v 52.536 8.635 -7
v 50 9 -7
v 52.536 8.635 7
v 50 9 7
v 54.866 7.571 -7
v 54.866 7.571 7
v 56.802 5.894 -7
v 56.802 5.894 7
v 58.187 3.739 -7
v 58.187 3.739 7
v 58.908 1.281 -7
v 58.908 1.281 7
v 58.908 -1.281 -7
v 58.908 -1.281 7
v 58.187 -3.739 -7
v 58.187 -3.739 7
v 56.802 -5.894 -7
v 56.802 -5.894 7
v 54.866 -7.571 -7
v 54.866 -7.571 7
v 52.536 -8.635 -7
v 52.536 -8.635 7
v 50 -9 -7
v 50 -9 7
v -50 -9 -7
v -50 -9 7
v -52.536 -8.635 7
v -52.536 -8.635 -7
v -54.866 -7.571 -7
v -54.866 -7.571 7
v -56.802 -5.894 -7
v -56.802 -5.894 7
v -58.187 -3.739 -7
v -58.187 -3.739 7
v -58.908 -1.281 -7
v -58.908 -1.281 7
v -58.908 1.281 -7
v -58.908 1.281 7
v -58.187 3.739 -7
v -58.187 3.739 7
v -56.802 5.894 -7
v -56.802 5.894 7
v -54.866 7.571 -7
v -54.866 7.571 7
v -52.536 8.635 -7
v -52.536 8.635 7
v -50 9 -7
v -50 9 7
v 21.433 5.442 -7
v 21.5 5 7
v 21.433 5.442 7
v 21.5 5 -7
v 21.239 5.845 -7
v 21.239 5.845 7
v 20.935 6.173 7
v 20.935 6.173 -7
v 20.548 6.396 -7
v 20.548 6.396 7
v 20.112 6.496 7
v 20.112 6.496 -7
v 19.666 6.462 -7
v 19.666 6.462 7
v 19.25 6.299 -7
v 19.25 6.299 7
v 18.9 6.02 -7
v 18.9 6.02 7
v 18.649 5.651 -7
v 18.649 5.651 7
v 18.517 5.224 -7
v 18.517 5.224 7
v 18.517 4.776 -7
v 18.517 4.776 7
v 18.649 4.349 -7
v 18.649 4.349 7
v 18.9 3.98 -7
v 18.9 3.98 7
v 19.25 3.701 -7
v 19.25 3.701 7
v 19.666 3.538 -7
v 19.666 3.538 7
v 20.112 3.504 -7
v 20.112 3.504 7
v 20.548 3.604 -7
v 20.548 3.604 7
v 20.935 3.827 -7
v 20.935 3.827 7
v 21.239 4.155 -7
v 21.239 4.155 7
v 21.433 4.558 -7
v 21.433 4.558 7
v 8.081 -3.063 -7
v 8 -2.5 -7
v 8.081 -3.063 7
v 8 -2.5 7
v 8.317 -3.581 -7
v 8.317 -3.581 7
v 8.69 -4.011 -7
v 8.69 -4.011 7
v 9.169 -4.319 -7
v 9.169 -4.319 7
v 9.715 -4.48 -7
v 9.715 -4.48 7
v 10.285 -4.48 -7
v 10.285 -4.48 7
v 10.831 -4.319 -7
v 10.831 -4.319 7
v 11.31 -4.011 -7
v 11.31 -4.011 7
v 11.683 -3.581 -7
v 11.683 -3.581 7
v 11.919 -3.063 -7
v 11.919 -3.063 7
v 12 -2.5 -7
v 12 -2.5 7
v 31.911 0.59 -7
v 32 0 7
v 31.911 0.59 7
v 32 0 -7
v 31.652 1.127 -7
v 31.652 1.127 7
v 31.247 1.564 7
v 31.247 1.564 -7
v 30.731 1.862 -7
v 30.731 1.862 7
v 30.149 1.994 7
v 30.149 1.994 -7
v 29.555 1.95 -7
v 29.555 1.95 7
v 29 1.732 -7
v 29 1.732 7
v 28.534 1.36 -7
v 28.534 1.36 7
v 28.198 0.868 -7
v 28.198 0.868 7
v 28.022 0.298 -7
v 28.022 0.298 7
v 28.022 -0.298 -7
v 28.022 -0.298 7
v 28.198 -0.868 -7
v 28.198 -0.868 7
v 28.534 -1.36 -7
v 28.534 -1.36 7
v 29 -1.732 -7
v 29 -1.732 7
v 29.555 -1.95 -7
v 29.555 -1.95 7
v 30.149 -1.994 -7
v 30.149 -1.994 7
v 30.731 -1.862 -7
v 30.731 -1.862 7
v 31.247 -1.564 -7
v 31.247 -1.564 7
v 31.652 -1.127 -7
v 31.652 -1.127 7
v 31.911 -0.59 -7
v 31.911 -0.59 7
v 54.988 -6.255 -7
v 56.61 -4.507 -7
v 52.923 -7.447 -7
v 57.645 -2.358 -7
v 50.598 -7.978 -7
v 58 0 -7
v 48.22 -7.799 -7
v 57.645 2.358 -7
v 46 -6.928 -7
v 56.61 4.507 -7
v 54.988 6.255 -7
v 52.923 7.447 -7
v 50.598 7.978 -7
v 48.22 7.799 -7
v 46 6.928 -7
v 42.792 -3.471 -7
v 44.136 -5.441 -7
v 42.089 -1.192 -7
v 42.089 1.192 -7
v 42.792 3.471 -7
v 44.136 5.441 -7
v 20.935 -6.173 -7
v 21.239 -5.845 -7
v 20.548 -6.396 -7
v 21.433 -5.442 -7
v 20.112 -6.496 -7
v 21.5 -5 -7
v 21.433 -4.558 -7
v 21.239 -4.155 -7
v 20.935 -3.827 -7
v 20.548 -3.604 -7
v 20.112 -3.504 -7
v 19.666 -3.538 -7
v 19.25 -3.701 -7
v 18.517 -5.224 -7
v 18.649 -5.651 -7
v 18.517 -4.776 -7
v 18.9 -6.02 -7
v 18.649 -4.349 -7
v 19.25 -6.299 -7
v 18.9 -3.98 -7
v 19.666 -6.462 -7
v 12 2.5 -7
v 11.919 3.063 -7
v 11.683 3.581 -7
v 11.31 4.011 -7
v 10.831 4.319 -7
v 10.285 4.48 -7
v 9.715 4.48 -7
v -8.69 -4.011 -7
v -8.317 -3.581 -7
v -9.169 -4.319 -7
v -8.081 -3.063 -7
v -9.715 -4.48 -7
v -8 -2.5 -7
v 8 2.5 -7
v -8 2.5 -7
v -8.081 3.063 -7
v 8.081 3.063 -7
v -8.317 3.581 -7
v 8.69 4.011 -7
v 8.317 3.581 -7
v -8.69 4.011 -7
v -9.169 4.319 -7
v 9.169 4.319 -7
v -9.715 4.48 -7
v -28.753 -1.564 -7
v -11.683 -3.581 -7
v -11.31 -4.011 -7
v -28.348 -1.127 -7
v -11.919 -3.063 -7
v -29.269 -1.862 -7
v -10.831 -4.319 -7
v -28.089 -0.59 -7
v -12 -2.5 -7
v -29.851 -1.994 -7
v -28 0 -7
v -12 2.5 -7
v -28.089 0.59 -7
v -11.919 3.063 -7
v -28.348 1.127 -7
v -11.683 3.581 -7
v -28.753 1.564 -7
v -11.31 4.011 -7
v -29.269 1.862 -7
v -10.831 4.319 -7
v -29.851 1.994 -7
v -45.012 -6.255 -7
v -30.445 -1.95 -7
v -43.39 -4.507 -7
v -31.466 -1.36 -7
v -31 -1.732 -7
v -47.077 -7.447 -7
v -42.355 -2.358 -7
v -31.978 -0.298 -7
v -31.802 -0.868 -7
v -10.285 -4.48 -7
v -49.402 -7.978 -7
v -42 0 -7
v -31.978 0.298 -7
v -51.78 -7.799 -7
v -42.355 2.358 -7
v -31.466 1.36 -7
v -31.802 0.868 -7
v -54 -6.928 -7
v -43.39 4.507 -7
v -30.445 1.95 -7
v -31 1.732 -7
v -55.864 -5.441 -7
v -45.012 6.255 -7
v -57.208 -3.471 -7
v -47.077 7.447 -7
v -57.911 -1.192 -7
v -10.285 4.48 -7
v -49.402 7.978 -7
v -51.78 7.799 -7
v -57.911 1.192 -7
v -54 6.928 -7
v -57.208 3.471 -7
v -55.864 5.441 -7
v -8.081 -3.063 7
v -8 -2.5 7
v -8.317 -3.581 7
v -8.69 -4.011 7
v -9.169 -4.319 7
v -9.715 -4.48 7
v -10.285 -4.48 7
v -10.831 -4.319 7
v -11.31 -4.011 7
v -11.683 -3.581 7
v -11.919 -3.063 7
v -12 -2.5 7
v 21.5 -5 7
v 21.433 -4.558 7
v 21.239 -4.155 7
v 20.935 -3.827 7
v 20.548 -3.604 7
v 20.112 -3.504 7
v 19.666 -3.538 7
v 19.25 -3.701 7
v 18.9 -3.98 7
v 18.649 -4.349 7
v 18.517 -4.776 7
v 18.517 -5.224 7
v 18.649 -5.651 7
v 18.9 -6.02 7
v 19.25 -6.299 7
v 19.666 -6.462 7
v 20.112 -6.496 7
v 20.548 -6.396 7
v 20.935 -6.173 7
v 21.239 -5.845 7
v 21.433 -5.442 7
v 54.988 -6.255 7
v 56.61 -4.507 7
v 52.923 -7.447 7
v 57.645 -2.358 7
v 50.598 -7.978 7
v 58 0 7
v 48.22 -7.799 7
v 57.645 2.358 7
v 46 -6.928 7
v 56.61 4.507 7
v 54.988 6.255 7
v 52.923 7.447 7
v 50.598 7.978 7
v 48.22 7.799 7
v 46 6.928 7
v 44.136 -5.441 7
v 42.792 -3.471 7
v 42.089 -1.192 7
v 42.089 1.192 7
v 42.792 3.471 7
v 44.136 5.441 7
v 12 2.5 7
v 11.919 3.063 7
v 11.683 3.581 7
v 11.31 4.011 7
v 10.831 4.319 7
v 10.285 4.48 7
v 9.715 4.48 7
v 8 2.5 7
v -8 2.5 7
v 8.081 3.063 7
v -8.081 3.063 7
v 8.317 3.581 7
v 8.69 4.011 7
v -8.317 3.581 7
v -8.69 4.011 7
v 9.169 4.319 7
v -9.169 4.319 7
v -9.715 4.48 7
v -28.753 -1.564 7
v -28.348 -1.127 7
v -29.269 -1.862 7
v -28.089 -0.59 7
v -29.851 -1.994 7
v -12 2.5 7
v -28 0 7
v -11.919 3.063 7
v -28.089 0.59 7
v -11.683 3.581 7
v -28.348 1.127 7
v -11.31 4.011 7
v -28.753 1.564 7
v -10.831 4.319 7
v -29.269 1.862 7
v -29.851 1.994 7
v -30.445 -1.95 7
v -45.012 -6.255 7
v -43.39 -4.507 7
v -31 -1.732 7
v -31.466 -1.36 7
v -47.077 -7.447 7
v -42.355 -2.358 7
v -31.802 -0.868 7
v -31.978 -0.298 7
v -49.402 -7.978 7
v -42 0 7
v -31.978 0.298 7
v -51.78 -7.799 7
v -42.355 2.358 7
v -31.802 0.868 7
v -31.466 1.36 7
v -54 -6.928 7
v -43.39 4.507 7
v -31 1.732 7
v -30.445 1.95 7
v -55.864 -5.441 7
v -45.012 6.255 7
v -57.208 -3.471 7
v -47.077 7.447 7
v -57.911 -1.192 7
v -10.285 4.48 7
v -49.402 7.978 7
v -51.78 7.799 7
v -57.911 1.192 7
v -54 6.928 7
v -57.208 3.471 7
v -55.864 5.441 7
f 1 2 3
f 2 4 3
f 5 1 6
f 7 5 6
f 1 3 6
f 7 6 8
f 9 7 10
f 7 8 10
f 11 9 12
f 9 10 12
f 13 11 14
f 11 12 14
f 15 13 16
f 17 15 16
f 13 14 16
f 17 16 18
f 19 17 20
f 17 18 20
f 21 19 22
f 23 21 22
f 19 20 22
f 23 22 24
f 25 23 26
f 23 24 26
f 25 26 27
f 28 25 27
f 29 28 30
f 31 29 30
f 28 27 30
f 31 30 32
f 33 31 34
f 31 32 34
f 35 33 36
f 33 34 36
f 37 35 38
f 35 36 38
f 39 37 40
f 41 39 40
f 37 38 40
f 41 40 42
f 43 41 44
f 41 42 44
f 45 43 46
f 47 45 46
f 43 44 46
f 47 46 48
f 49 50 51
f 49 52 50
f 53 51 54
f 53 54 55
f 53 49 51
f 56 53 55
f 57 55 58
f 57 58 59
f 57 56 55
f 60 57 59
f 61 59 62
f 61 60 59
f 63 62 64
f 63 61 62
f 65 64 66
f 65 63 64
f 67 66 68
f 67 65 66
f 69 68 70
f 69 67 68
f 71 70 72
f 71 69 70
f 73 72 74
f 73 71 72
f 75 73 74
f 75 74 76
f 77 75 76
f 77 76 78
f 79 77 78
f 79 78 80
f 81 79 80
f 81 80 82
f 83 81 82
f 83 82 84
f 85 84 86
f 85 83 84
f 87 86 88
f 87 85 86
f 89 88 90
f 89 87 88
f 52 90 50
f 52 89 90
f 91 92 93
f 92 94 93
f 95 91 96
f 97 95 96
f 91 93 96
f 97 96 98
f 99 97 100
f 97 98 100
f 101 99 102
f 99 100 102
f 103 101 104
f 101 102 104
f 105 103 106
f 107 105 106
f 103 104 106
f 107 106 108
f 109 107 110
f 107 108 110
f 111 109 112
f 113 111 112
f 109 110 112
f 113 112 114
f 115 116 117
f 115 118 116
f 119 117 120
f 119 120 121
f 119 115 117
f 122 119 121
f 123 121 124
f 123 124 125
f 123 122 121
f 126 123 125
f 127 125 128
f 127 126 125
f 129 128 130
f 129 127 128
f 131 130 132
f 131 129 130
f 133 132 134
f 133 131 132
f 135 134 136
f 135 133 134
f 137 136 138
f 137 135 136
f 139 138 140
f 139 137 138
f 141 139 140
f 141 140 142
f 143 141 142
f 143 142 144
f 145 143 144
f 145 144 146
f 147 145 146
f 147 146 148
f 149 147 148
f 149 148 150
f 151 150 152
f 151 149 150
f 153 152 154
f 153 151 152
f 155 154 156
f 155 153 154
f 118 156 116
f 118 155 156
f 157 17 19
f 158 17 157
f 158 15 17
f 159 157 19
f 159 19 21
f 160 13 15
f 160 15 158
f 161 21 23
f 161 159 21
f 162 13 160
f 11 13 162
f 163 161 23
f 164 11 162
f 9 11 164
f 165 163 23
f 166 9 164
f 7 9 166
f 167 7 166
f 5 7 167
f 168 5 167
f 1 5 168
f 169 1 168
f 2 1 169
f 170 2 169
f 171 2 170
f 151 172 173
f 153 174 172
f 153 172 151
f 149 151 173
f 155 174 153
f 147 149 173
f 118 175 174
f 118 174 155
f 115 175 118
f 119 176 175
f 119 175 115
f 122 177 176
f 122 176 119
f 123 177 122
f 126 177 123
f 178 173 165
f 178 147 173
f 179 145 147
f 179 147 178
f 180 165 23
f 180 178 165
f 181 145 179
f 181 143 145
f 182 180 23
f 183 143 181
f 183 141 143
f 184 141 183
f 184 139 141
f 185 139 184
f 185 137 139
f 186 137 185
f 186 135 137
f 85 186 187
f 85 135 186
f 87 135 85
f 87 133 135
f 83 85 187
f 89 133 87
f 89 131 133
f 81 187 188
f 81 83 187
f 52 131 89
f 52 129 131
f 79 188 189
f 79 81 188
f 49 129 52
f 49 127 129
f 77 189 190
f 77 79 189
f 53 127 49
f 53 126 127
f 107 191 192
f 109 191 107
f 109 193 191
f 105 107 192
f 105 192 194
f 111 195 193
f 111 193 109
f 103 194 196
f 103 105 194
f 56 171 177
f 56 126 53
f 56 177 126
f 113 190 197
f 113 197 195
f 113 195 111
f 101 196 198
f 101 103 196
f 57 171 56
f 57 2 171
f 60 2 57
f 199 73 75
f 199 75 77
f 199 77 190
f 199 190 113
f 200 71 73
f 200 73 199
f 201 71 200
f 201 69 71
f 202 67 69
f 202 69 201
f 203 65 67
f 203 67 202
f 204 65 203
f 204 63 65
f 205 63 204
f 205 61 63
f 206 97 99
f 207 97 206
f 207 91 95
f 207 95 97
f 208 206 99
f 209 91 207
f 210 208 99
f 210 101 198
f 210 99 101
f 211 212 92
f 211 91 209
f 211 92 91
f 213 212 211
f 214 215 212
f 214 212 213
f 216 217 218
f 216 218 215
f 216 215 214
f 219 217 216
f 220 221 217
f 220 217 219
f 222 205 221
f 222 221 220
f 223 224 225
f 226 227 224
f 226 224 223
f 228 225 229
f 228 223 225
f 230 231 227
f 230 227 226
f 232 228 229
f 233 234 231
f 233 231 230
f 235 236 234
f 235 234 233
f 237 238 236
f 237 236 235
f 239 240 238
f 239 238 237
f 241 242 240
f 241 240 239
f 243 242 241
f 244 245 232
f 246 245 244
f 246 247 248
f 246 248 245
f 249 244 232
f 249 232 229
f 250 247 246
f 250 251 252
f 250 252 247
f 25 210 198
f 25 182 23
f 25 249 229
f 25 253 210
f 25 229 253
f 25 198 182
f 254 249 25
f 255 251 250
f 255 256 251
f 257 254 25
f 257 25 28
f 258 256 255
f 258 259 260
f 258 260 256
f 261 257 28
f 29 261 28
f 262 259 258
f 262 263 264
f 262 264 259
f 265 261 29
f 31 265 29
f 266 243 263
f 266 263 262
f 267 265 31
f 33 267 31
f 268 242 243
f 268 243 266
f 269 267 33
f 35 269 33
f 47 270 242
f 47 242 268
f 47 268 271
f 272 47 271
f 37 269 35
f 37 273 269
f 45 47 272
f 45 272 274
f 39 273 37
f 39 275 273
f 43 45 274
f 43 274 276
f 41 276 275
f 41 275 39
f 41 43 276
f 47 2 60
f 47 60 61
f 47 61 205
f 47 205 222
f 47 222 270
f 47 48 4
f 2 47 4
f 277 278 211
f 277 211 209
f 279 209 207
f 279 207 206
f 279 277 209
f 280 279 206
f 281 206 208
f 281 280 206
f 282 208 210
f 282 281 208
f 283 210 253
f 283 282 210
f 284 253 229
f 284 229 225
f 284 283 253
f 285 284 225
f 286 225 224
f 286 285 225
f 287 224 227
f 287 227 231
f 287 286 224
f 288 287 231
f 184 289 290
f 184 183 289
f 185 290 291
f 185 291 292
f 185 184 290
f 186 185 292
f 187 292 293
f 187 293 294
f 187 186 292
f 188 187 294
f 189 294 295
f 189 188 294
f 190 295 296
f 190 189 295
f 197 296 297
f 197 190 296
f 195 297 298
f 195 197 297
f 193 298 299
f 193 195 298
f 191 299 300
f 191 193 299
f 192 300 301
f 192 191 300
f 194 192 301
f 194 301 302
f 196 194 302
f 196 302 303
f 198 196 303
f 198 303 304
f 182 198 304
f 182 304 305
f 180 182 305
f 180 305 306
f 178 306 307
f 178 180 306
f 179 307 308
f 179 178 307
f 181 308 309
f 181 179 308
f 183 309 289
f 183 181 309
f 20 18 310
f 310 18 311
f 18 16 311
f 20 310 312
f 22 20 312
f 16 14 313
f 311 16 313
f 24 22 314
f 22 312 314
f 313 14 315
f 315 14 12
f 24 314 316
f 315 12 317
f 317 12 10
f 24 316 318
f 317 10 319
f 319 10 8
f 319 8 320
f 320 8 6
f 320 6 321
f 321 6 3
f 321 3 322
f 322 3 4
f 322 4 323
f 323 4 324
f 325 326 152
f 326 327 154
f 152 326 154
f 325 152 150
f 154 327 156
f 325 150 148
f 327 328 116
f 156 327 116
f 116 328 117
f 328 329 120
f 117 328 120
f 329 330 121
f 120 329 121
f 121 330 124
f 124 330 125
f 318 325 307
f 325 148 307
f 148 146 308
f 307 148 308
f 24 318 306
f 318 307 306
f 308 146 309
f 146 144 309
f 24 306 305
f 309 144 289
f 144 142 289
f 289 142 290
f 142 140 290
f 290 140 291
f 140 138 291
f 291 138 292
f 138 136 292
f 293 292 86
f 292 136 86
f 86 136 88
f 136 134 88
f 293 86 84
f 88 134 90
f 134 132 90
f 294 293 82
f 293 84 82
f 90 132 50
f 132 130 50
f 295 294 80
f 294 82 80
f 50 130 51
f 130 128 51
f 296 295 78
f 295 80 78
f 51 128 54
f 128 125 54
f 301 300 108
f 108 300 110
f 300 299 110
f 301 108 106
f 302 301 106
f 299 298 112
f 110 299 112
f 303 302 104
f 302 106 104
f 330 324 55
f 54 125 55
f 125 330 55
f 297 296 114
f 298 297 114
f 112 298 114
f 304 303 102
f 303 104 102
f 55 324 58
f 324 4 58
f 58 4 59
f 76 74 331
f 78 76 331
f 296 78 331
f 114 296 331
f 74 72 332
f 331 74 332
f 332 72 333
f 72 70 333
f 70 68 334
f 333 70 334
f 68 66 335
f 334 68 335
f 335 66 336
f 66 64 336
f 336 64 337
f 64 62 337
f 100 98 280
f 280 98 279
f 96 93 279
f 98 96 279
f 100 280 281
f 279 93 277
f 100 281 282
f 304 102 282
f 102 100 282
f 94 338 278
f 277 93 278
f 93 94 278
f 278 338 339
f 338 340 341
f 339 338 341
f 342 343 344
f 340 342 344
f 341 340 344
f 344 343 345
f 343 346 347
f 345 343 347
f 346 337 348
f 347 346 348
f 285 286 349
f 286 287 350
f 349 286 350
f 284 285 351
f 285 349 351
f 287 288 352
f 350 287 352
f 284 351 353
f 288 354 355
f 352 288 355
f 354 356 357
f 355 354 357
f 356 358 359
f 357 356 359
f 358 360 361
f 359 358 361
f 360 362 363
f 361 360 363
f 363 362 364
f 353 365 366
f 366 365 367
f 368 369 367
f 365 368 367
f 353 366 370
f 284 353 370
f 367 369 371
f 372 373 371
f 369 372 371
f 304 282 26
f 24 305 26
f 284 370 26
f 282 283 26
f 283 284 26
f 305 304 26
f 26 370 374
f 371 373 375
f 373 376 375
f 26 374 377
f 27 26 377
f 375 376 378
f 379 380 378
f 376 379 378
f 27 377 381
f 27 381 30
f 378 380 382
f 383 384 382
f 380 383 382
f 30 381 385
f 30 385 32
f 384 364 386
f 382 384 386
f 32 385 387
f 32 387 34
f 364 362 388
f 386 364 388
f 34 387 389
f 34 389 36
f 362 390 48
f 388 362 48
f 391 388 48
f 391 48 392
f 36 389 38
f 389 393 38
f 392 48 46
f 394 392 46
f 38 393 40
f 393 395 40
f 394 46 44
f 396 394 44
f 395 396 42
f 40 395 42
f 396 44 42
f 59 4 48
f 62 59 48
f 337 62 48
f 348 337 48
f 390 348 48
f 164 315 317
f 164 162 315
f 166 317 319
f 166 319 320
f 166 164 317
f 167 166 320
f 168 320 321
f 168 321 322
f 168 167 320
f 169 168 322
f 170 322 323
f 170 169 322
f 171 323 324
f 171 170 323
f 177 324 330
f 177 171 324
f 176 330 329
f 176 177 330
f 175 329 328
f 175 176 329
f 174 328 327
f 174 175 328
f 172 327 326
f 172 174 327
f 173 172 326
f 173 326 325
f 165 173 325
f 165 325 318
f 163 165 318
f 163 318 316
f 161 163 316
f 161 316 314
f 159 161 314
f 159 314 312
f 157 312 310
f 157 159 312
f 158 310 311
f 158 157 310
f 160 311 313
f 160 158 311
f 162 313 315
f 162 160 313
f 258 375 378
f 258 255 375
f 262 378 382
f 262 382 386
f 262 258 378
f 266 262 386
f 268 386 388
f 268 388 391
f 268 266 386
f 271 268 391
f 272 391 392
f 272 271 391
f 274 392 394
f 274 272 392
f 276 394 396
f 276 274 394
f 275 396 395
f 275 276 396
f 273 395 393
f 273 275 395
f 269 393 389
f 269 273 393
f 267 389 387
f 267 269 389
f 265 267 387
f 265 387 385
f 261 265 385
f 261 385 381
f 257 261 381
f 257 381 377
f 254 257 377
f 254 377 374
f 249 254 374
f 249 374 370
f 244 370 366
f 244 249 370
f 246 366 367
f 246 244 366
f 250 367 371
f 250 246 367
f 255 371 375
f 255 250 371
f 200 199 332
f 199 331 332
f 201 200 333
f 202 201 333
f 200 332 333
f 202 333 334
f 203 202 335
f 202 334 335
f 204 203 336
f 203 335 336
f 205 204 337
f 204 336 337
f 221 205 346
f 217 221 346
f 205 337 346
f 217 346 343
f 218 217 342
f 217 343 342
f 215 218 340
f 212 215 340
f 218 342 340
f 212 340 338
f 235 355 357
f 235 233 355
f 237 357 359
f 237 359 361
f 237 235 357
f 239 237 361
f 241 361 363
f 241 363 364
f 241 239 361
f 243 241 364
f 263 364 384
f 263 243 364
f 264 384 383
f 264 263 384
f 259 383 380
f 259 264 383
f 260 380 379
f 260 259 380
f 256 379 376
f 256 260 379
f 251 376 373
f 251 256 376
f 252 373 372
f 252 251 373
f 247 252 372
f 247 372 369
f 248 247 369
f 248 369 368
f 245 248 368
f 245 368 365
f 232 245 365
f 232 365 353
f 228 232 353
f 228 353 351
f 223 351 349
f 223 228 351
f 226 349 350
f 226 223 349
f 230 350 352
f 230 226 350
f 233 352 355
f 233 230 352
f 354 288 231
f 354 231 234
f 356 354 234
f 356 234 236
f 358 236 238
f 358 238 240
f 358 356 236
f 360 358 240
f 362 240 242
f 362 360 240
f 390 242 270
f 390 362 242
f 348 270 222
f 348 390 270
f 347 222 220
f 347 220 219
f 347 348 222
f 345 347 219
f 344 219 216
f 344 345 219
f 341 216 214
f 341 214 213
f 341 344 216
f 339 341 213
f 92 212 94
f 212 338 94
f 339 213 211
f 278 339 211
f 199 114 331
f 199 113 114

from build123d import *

# Parameters (mm, degrees)
SKETCH1_R           = 2
SKETCH1_R_2         = 8
SKETCH1_R_3         = 1.5
BOSS_EXTRUDE1_DEPTH = 7


with BuildPart() as part:
    # Sketch1 → Boss-Extrude1 (new, symmetric)
    with BuildSketch(Plane.XY):
        with BuildLine():
            Line((-50, 9), (50, 9))
            ThreePointArc((50, 9), (59, 0), (50, -9))
            Line((50, -9), (-50, -9))
            ThreePointArc((-50, -9), (-59, 0), (-50, 9))
        make_face()
        with Locations((-30, 0)):
            Circle(SKETCH1_R, mode=Mode.SUBTRACT)
        with Locations((30, 0)):
            Circle(SKETCH1_R, mode=Mode.SUBTRACT)
        with Locations((-50, 0)):
            Circle(SKETCH1_R_2, mode=Mode.SUBTRACT)
        with Locations((50, 0)):
            Circle(SKETCH1_R_2, mode=Mode.SUBTRACT)
        with Locations((20, -5)):
            Circle(SKETCH1_R_3, mode=Mode.SUBTRACT)
        with Locations((20, 5)):
            Circle(SKETCH1_R_3, mode=Mode.SUBTRACT)
        with BuildLine():
            Line((-12, -2.5), (-12, 2.5))
            ThreePointArc((-12, 2.5), (-10, 4.5), (-8, 2.5))
            Line((-8, 2.5), (-8, -2.5))
            ThreePointArc((-8, -2.5), (-10, -4.5), (-12, -2.5))
        make_face(mode=Mode.SUBTRACT)
        with BuildLine():
            Line((12, -2.5), (12, 2.5))
            ThreePointArc((12, 2.5), (10, 4.5), (8, 2.5))
            Line((8, 2.5), (8, -2.5))
            ThreePointArc((8, -2.5), (10, -4.5), (12, -2.5))
        make_face(mode=Mode.SUBTRACT)
    extrude(amount=BOSS_EXTRUDE1_DEPTH, both=True)


solid = part.part
